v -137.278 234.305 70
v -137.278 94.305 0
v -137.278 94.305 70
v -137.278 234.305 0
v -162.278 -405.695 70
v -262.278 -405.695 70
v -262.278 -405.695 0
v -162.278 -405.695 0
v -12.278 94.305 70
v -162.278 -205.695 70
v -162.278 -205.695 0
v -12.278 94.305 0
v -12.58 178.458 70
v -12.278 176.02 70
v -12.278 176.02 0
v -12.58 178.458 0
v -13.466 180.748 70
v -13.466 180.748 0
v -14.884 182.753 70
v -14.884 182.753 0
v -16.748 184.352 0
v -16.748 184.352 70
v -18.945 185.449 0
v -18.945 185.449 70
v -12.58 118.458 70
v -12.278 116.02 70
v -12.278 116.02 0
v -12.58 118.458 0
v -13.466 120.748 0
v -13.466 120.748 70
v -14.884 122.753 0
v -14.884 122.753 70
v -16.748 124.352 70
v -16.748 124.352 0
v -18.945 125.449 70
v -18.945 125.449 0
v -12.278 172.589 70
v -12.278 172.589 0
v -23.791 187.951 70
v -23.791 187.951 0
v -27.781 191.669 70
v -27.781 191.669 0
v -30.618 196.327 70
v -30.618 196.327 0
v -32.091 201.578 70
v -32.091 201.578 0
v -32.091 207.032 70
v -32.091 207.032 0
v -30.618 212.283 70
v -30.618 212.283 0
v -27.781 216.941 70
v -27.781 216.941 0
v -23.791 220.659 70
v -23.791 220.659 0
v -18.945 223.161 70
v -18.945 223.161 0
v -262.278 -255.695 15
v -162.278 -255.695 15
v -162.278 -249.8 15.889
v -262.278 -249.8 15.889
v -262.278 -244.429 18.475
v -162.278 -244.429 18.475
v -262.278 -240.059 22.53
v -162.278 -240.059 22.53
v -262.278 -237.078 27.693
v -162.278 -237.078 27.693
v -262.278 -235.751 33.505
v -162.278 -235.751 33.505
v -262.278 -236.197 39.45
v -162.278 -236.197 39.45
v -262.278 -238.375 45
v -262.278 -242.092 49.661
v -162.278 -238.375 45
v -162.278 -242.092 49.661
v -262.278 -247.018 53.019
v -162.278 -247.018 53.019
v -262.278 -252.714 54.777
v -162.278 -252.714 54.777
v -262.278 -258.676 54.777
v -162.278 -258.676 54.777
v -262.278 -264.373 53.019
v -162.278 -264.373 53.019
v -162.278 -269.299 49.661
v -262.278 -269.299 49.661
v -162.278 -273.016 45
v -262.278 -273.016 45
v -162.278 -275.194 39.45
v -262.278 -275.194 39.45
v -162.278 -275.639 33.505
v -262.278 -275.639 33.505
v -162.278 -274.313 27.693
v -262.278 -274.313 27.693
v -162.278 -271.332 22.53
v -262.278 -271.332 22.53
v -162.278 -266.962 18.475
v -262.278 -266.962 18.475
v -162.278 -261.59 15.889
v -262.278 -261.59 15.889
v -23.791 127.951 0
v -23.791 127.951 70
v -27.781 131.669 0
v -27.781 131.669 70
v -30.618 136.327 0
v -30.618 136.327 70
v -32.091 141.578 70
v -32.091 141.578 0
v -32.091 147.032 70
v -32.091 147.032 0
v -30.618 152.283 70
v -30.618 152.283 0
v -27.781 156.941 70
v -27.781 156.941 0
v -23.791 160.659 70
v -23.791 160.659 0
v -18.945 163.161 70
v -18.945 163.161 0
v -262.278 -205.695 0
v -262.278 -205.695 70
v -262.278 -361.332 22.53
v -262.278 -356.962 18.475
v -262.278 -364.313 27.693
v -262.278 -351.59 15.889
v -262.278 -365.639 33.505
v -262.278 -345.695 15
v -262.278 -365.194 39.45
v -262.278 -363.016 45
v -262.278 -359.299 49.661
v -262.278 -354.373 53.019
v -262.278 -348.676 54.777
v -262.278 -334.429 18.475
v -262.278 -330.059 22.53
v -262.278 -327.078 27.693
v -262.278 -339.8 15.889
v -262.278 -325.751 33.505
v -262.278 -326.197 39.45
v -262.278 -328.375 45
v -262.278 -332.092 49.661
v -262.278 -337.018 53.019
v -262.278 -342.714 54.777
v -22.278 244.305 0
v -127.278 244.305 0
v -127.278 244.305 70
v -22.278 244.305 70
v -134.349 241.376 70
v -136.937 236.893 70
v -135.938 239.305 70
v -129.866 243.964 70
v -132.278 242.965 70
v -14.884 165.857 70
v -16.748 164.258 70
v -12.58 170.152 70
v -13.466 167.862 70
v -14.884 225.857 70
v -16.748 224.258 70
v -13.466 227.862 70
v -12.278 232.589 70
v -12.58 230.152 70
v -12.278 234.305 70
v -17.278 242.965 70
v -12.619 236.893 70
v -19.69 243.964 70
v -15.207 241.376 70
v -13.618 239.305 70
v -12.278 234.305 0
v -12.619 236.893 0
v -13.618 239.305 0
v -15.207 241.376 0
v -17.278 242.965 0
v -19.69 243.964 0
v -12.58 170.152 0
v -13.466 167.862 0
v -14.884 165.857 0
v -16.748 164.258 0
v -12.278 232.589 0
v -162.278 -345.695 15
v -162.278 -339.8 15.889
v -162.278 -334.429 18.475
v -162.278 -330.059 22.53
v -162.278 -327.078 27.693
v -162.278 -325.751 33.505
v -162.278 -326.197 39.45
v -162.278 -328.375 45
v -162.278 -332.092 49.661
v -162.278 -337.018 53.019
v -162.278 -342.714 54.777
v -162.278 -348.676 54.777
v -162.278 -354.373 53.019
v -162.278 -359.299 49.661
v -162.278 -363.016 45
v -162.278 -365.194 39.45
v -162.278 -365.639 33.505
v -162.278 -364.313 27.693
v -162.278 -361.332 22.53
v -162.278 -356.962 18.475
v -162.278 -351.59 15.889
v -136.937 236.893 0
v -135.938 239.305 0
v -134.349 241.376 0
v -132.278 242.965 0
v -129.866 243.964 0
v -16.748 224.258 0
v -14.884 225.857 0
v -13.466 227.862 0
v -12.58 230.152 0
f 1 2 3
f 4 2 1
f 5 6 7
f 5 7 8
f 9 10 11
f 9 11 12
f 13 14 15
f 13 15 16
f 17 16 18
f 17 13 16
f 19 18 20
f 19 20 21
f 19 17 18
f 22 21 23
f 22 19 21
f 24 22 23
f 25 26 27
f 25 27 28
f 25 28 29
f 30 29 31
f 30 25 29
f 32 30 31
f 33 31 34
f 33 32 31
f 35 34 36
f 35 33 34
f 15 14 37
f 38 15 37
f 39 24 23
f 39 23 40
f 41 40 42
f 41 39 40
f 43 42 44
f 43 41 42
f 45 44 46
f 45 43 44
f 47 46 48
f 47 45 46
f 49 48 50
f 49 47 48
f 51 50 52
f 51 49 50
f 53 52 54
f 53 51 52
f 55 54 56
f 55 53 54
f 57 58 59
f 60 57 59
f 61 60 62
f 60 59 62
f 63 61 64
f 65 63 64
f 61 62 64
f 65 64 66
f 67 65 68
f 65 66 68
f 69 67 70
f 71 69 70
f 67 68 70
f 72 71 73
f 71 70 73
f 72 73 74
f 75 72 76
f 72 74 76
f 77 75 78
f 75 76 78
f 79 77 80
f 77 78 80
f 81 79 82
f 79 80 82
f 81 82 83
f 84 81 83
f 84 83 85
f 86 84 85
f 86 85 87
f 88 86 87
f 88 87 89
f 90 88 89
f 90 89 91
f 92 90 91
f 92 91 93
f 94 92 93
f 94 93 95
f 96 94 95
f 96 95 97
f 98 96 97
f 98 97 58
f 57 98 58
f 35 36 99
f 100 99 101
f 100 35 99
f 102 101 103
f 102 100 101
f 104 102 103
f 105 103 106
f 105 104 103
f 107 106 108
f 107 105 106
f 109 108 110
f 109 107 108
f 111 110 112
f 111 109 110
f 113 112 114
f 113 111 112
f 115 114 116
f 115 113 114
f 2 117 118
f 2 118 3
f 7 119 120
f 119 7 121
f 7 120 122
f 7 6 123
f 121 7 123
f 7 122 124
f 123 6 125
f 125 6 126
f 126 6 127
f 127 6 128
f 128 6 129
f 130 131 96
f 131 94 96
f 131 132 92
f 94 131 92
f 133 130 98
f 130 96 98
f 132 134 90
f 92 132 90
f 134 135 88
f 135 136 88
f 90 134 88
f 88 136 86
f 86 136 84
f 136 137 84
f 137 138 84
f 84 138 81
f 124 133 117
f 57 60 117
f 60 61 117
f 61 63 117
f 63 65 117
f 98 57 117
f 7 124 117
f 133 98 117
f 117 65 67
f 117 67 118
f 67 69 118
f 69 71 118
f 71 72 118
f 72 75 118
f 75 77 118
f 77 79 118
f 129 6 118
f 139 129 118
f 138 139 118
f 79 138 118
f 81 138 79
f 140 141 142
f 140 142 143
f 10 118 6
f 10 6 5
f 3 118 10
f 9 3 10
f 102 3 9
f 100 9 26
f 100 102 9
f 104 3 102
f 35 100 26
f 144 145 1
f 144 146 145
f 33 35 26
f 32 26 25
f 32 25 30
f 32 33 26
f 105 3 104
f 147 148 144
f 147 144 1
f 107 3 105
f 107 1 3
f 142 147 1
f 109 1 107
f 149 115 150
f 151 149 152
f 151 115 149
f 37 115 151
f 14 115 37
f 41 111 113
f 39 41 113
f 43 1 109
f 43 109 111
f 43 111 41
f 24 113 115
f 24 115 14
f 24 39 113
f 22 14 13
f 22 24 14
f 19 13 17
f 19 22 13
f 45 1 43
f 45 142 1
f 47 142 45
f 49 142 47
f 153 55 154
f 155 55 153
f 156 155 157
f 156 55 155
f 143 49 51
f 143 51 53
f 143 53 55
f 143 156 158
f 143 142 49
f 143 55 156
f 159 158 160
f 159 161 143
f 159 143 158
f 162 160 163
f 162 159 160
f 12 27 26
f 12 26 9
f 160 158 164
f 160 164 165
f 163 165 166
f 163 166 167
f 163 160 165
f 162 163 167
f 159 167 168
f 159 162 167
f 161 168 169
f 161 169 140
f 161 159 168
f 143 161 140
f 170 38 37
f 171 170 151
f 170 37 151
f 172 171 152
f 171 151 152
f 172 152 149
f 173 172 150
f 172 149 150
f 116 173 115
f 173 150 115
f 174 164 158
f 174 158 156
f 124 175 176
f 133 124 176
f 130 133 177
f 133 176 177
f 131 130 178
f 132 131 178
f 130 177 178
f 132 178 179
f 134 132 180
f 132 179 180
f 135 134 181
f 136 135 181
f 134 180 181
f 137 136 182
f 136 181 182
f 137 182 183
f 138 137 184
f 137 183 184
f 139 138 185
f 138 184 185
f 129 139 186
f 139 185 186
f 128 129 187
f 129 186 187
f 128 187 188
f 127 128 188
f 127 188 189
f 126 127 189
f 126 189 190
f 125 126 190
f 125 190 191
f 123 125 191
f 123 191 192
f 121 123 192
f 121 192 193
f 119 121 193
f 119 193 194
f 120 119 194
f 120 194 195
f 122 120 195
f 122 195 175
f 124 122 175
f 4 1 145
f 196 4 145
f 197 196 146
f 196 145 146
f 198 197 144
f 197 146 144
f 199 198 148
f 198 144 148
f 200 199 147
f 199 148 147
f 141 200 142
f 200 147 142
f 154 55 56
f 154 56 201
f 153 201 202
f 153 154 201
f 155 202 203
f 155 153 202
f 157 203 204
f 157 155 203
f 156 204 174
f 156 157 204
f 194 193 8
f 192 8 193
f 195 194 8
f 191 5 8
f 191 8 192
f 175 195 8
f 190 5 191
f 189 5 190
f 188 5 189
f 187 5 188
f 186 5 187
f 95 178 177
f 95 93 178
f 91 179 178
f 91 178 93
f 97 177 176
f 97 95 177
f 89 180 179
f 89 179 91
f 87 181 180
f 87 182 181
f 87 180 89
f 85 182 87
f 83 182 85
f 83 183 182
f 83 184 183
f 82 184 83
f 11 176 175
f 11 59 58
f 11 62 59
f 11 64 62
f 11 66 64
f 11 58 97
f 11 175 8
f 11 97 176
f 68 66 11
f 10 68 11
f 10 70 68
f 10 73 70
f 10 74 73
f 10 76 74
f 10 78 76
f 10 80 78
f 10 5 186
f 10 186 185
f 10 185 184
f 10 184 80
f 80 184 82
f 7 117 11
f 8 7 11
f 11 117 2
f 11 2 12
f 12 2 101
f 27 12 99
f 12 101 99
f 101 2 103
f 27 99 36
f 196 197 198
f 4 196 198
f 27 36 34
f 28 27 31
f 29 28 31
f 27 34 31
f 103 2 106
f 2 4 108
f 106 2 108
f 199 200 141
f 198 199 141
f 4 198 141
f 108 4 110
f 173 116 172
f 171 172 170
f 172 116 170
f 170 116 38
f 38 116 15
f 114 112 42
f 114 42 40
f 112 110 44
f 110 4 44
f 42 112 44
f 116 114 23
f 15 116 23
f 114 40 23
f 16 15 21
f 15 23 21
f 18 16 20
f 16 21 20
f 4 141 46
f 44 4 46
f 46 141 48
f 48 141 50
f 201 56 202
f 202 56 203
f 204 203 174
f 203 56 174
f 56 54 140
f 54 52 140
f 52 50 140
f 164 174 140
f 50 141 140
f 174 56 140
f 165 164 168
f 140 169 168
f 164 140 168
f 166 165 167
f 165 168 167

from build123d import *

# Parameters (mm, degrees)
BOSS_EXTRUDE2_DEPTH = 70
SKETCH2_W           = 100
SKETCH2_H           = 200
BOSS_EXTRUDE3_DEPTH = 70
SKETCH3_R           = 20
CUT_EXTRUDE1_DEPTH  = 132
CUT_EXTRUDE2_DEPTH  = 132
CUT_EXTRUDE3_DEPTH  = 132
CUT_EXTRUDE4_DEPTH  = 79
CUT_EXTRUDE6_DEPTH  = 79
CUT_EXTRUDE7_DEPTH  = 79
CUT_EXTRUDE8_DEPTH  = 79


with BuildPart() as part:
    # Sketch1 → Boss-Extrude2 (new body)
    with BuildSketch(Plane.XY):
        Polygon((-137.278106509, 244.304733728), (-12.278106509, 244.304733728), (-12.278106509, -205.695266272), (-262.278106509, -205.695266272), (-137.278106509, 94.304733728), align=None)
    extrude(amount=BOSS_EXTRUDE2_DEPTH)

    # Sketch2 → Boss-Extrude3 (add)
    with BuildSketch(Plane.XY.offset(70)):
        with Locations((-212.278106509, -305.695266272)):
            Rectangle(SKETCH2_W, SKETCH2_H)
    extrude(amount=-BOSS_EXTRUDE3_DEPTH)

    # Sketch3 → Cut-Extrude1 (cut)
    with BuildSketch(Plane(origin=(-162.278106509, 0, 0), x_dir=(0, 0, -1), z_dir=(1, 0, 0))):
        with Locations((-35, -255.695266272)):
            Circle(SKETCH3_R)
        with Locations((-35, -345.695266272)):
            Circle(SKETCH3_R)
    extrude(amount=-CUT_EXTRUDE1_DEPTH, mode=Mode.SUBTRACT)

    # Sketch5 → Cut-Extrude2 (cut)
    with BuildSketch(Plane.XY.offset(70)):
        Polygon((-12.278106509, 94.304733728), (-12.278106509, -205.695266272), (-162.278106509, -205.695266272), align=None)
    extrude(amount=-CUT_EXTRUDE2_DEPTH, mode=Mode.SUBTRACT)

    # Sketch6 → Cut-Extrude3 (cut)
    with BuildSketch(Plane.XY.offset(70)):
        with BuildLine():
            Line((-12.278106509, 224.304733728), (-12.278106509, 204.304733728))
            Line((-12.278106509, 204.304733728), (-12.278106509, 184.304733728))
            ThreePointArc((-12.278106509, 184.304733728), (-32.278106509, 204.304733728), (-12.278106509, 224.304733728))
        make_face()
        with BuildLine():
            Line((-12.278106509, 144.304733728), (-12.278106509, 124.304733728))
            ThreePointArc((-12.278106509, 124.304733728), (-32.278106509, 144.304733728), (-12.278106509, 164.304733728))
            Line((-12.278106509, 164.304733728), (-12.278106509, 144.304733728))
        make_face()
    extrude(amount=-CUT_EXTRUDE3_DEPTH, mode=Mode.SUBTRACT)

    # Sketch9 → Cut-Extrude4 (cut)
    with BuildSketch(Plane.XY.offset(70)):
        with BuildLine():
            Line((-127.278106509, 244.304733728), (-137.278106509, 244.304733728))
            Line((-137.278106509, 244.304733728), (-137.278106509, 234.304733728))
            ThreePointArc((-137.278106509, 234.304733728), (-134.349174321, 241.37580154), (-127.278106509, 244.304733728))
        make_face()
    extrude(amount=-CUT_EXTRUDE4_DEPTH, mode=Mode.SUBTRACT)

    # Sketch11 → Cut-Extrude6 (cut)
    with BuildSketch(Plane.XY.offset(70)):
        with BuildLine():
            Line((-12.278106509, 232.589004975), (-12.278106509, 224.304733728))
            Line((-12.278106509, 224.304733728), (-18.944773176, 223.160914559))
            ThreePointArc((-18.944773176, 223.160914559), (-14.1131407, 226.815502283), (-12.278106509, 232.589004975))
        make_face()
    extrude(amount=-CUT_EXTRUDE6_DEPTH, mode=Mode.SUBTRACT)

    # Sketch12 → Cut-Extrude7 (cut)
    with BuildSketch(Plane.XY.offset(70)):
        with BuildLine():
            Line((-18.944773176, 125.448552896), (-12.278106509, 124.304733728))
            Line((-12.278106509, 124.304733728), (-12.278106509, 116.02046248))
            ThreePointArc((-12.278106509, 116.02046248), (-14.1131407, 121.793965172), (-18.944773176, 125.448552896))
        make_face()
        with BuildLine():
            Line((-18.944773176, 185.448552896), (-12.278106509, 184.304733728))
            Line((-12.278106509, 184.304733728), (-12.278106509, 176.02046248))
            ThreePointArc((-12.278106509, 176.02046248), (-14.1131407, 181.793965172), (-18.944773176, 185.448552896))
        make_face()
        with BuildLine():
            Line((-18.944773176, 163.160914559), (-12.278106509, 164.304733728))
            Line((-12.278106509, 164.304733728), (-12.278106509, 172.589004975))
            ThreePointArc((-12.278106509, 172.589004975), (-14.1131407, 166.815502283), (-18.944773176, 163.160914559))
        make_face()
    extrude(amount=-CUT_EXTRUDE7_DEPTH, mode=Mode.SUBTRACT)

    # Sketch13 → Cut-Extrude8 (cut)
    with BuildSketch(Plane.XY.offset(70)):
        with BuildLine():
            Line((-22.278106509, 244.304733728), (-12.278106509, 244.304733728))
            Line((-12.278106509, 244.304733728), (-12.278106509, 234.304733728))
            ThreePointArc((-12.278106509, 234.304733728), (-15.207038697, 241.37580154), (-22.278106509, 244.304733728))
        make_face()
    extrude(amount=-CUT_EXTRUDE8_DEPTH, mode=Mode.SUBTRACT)


solid = part.part
